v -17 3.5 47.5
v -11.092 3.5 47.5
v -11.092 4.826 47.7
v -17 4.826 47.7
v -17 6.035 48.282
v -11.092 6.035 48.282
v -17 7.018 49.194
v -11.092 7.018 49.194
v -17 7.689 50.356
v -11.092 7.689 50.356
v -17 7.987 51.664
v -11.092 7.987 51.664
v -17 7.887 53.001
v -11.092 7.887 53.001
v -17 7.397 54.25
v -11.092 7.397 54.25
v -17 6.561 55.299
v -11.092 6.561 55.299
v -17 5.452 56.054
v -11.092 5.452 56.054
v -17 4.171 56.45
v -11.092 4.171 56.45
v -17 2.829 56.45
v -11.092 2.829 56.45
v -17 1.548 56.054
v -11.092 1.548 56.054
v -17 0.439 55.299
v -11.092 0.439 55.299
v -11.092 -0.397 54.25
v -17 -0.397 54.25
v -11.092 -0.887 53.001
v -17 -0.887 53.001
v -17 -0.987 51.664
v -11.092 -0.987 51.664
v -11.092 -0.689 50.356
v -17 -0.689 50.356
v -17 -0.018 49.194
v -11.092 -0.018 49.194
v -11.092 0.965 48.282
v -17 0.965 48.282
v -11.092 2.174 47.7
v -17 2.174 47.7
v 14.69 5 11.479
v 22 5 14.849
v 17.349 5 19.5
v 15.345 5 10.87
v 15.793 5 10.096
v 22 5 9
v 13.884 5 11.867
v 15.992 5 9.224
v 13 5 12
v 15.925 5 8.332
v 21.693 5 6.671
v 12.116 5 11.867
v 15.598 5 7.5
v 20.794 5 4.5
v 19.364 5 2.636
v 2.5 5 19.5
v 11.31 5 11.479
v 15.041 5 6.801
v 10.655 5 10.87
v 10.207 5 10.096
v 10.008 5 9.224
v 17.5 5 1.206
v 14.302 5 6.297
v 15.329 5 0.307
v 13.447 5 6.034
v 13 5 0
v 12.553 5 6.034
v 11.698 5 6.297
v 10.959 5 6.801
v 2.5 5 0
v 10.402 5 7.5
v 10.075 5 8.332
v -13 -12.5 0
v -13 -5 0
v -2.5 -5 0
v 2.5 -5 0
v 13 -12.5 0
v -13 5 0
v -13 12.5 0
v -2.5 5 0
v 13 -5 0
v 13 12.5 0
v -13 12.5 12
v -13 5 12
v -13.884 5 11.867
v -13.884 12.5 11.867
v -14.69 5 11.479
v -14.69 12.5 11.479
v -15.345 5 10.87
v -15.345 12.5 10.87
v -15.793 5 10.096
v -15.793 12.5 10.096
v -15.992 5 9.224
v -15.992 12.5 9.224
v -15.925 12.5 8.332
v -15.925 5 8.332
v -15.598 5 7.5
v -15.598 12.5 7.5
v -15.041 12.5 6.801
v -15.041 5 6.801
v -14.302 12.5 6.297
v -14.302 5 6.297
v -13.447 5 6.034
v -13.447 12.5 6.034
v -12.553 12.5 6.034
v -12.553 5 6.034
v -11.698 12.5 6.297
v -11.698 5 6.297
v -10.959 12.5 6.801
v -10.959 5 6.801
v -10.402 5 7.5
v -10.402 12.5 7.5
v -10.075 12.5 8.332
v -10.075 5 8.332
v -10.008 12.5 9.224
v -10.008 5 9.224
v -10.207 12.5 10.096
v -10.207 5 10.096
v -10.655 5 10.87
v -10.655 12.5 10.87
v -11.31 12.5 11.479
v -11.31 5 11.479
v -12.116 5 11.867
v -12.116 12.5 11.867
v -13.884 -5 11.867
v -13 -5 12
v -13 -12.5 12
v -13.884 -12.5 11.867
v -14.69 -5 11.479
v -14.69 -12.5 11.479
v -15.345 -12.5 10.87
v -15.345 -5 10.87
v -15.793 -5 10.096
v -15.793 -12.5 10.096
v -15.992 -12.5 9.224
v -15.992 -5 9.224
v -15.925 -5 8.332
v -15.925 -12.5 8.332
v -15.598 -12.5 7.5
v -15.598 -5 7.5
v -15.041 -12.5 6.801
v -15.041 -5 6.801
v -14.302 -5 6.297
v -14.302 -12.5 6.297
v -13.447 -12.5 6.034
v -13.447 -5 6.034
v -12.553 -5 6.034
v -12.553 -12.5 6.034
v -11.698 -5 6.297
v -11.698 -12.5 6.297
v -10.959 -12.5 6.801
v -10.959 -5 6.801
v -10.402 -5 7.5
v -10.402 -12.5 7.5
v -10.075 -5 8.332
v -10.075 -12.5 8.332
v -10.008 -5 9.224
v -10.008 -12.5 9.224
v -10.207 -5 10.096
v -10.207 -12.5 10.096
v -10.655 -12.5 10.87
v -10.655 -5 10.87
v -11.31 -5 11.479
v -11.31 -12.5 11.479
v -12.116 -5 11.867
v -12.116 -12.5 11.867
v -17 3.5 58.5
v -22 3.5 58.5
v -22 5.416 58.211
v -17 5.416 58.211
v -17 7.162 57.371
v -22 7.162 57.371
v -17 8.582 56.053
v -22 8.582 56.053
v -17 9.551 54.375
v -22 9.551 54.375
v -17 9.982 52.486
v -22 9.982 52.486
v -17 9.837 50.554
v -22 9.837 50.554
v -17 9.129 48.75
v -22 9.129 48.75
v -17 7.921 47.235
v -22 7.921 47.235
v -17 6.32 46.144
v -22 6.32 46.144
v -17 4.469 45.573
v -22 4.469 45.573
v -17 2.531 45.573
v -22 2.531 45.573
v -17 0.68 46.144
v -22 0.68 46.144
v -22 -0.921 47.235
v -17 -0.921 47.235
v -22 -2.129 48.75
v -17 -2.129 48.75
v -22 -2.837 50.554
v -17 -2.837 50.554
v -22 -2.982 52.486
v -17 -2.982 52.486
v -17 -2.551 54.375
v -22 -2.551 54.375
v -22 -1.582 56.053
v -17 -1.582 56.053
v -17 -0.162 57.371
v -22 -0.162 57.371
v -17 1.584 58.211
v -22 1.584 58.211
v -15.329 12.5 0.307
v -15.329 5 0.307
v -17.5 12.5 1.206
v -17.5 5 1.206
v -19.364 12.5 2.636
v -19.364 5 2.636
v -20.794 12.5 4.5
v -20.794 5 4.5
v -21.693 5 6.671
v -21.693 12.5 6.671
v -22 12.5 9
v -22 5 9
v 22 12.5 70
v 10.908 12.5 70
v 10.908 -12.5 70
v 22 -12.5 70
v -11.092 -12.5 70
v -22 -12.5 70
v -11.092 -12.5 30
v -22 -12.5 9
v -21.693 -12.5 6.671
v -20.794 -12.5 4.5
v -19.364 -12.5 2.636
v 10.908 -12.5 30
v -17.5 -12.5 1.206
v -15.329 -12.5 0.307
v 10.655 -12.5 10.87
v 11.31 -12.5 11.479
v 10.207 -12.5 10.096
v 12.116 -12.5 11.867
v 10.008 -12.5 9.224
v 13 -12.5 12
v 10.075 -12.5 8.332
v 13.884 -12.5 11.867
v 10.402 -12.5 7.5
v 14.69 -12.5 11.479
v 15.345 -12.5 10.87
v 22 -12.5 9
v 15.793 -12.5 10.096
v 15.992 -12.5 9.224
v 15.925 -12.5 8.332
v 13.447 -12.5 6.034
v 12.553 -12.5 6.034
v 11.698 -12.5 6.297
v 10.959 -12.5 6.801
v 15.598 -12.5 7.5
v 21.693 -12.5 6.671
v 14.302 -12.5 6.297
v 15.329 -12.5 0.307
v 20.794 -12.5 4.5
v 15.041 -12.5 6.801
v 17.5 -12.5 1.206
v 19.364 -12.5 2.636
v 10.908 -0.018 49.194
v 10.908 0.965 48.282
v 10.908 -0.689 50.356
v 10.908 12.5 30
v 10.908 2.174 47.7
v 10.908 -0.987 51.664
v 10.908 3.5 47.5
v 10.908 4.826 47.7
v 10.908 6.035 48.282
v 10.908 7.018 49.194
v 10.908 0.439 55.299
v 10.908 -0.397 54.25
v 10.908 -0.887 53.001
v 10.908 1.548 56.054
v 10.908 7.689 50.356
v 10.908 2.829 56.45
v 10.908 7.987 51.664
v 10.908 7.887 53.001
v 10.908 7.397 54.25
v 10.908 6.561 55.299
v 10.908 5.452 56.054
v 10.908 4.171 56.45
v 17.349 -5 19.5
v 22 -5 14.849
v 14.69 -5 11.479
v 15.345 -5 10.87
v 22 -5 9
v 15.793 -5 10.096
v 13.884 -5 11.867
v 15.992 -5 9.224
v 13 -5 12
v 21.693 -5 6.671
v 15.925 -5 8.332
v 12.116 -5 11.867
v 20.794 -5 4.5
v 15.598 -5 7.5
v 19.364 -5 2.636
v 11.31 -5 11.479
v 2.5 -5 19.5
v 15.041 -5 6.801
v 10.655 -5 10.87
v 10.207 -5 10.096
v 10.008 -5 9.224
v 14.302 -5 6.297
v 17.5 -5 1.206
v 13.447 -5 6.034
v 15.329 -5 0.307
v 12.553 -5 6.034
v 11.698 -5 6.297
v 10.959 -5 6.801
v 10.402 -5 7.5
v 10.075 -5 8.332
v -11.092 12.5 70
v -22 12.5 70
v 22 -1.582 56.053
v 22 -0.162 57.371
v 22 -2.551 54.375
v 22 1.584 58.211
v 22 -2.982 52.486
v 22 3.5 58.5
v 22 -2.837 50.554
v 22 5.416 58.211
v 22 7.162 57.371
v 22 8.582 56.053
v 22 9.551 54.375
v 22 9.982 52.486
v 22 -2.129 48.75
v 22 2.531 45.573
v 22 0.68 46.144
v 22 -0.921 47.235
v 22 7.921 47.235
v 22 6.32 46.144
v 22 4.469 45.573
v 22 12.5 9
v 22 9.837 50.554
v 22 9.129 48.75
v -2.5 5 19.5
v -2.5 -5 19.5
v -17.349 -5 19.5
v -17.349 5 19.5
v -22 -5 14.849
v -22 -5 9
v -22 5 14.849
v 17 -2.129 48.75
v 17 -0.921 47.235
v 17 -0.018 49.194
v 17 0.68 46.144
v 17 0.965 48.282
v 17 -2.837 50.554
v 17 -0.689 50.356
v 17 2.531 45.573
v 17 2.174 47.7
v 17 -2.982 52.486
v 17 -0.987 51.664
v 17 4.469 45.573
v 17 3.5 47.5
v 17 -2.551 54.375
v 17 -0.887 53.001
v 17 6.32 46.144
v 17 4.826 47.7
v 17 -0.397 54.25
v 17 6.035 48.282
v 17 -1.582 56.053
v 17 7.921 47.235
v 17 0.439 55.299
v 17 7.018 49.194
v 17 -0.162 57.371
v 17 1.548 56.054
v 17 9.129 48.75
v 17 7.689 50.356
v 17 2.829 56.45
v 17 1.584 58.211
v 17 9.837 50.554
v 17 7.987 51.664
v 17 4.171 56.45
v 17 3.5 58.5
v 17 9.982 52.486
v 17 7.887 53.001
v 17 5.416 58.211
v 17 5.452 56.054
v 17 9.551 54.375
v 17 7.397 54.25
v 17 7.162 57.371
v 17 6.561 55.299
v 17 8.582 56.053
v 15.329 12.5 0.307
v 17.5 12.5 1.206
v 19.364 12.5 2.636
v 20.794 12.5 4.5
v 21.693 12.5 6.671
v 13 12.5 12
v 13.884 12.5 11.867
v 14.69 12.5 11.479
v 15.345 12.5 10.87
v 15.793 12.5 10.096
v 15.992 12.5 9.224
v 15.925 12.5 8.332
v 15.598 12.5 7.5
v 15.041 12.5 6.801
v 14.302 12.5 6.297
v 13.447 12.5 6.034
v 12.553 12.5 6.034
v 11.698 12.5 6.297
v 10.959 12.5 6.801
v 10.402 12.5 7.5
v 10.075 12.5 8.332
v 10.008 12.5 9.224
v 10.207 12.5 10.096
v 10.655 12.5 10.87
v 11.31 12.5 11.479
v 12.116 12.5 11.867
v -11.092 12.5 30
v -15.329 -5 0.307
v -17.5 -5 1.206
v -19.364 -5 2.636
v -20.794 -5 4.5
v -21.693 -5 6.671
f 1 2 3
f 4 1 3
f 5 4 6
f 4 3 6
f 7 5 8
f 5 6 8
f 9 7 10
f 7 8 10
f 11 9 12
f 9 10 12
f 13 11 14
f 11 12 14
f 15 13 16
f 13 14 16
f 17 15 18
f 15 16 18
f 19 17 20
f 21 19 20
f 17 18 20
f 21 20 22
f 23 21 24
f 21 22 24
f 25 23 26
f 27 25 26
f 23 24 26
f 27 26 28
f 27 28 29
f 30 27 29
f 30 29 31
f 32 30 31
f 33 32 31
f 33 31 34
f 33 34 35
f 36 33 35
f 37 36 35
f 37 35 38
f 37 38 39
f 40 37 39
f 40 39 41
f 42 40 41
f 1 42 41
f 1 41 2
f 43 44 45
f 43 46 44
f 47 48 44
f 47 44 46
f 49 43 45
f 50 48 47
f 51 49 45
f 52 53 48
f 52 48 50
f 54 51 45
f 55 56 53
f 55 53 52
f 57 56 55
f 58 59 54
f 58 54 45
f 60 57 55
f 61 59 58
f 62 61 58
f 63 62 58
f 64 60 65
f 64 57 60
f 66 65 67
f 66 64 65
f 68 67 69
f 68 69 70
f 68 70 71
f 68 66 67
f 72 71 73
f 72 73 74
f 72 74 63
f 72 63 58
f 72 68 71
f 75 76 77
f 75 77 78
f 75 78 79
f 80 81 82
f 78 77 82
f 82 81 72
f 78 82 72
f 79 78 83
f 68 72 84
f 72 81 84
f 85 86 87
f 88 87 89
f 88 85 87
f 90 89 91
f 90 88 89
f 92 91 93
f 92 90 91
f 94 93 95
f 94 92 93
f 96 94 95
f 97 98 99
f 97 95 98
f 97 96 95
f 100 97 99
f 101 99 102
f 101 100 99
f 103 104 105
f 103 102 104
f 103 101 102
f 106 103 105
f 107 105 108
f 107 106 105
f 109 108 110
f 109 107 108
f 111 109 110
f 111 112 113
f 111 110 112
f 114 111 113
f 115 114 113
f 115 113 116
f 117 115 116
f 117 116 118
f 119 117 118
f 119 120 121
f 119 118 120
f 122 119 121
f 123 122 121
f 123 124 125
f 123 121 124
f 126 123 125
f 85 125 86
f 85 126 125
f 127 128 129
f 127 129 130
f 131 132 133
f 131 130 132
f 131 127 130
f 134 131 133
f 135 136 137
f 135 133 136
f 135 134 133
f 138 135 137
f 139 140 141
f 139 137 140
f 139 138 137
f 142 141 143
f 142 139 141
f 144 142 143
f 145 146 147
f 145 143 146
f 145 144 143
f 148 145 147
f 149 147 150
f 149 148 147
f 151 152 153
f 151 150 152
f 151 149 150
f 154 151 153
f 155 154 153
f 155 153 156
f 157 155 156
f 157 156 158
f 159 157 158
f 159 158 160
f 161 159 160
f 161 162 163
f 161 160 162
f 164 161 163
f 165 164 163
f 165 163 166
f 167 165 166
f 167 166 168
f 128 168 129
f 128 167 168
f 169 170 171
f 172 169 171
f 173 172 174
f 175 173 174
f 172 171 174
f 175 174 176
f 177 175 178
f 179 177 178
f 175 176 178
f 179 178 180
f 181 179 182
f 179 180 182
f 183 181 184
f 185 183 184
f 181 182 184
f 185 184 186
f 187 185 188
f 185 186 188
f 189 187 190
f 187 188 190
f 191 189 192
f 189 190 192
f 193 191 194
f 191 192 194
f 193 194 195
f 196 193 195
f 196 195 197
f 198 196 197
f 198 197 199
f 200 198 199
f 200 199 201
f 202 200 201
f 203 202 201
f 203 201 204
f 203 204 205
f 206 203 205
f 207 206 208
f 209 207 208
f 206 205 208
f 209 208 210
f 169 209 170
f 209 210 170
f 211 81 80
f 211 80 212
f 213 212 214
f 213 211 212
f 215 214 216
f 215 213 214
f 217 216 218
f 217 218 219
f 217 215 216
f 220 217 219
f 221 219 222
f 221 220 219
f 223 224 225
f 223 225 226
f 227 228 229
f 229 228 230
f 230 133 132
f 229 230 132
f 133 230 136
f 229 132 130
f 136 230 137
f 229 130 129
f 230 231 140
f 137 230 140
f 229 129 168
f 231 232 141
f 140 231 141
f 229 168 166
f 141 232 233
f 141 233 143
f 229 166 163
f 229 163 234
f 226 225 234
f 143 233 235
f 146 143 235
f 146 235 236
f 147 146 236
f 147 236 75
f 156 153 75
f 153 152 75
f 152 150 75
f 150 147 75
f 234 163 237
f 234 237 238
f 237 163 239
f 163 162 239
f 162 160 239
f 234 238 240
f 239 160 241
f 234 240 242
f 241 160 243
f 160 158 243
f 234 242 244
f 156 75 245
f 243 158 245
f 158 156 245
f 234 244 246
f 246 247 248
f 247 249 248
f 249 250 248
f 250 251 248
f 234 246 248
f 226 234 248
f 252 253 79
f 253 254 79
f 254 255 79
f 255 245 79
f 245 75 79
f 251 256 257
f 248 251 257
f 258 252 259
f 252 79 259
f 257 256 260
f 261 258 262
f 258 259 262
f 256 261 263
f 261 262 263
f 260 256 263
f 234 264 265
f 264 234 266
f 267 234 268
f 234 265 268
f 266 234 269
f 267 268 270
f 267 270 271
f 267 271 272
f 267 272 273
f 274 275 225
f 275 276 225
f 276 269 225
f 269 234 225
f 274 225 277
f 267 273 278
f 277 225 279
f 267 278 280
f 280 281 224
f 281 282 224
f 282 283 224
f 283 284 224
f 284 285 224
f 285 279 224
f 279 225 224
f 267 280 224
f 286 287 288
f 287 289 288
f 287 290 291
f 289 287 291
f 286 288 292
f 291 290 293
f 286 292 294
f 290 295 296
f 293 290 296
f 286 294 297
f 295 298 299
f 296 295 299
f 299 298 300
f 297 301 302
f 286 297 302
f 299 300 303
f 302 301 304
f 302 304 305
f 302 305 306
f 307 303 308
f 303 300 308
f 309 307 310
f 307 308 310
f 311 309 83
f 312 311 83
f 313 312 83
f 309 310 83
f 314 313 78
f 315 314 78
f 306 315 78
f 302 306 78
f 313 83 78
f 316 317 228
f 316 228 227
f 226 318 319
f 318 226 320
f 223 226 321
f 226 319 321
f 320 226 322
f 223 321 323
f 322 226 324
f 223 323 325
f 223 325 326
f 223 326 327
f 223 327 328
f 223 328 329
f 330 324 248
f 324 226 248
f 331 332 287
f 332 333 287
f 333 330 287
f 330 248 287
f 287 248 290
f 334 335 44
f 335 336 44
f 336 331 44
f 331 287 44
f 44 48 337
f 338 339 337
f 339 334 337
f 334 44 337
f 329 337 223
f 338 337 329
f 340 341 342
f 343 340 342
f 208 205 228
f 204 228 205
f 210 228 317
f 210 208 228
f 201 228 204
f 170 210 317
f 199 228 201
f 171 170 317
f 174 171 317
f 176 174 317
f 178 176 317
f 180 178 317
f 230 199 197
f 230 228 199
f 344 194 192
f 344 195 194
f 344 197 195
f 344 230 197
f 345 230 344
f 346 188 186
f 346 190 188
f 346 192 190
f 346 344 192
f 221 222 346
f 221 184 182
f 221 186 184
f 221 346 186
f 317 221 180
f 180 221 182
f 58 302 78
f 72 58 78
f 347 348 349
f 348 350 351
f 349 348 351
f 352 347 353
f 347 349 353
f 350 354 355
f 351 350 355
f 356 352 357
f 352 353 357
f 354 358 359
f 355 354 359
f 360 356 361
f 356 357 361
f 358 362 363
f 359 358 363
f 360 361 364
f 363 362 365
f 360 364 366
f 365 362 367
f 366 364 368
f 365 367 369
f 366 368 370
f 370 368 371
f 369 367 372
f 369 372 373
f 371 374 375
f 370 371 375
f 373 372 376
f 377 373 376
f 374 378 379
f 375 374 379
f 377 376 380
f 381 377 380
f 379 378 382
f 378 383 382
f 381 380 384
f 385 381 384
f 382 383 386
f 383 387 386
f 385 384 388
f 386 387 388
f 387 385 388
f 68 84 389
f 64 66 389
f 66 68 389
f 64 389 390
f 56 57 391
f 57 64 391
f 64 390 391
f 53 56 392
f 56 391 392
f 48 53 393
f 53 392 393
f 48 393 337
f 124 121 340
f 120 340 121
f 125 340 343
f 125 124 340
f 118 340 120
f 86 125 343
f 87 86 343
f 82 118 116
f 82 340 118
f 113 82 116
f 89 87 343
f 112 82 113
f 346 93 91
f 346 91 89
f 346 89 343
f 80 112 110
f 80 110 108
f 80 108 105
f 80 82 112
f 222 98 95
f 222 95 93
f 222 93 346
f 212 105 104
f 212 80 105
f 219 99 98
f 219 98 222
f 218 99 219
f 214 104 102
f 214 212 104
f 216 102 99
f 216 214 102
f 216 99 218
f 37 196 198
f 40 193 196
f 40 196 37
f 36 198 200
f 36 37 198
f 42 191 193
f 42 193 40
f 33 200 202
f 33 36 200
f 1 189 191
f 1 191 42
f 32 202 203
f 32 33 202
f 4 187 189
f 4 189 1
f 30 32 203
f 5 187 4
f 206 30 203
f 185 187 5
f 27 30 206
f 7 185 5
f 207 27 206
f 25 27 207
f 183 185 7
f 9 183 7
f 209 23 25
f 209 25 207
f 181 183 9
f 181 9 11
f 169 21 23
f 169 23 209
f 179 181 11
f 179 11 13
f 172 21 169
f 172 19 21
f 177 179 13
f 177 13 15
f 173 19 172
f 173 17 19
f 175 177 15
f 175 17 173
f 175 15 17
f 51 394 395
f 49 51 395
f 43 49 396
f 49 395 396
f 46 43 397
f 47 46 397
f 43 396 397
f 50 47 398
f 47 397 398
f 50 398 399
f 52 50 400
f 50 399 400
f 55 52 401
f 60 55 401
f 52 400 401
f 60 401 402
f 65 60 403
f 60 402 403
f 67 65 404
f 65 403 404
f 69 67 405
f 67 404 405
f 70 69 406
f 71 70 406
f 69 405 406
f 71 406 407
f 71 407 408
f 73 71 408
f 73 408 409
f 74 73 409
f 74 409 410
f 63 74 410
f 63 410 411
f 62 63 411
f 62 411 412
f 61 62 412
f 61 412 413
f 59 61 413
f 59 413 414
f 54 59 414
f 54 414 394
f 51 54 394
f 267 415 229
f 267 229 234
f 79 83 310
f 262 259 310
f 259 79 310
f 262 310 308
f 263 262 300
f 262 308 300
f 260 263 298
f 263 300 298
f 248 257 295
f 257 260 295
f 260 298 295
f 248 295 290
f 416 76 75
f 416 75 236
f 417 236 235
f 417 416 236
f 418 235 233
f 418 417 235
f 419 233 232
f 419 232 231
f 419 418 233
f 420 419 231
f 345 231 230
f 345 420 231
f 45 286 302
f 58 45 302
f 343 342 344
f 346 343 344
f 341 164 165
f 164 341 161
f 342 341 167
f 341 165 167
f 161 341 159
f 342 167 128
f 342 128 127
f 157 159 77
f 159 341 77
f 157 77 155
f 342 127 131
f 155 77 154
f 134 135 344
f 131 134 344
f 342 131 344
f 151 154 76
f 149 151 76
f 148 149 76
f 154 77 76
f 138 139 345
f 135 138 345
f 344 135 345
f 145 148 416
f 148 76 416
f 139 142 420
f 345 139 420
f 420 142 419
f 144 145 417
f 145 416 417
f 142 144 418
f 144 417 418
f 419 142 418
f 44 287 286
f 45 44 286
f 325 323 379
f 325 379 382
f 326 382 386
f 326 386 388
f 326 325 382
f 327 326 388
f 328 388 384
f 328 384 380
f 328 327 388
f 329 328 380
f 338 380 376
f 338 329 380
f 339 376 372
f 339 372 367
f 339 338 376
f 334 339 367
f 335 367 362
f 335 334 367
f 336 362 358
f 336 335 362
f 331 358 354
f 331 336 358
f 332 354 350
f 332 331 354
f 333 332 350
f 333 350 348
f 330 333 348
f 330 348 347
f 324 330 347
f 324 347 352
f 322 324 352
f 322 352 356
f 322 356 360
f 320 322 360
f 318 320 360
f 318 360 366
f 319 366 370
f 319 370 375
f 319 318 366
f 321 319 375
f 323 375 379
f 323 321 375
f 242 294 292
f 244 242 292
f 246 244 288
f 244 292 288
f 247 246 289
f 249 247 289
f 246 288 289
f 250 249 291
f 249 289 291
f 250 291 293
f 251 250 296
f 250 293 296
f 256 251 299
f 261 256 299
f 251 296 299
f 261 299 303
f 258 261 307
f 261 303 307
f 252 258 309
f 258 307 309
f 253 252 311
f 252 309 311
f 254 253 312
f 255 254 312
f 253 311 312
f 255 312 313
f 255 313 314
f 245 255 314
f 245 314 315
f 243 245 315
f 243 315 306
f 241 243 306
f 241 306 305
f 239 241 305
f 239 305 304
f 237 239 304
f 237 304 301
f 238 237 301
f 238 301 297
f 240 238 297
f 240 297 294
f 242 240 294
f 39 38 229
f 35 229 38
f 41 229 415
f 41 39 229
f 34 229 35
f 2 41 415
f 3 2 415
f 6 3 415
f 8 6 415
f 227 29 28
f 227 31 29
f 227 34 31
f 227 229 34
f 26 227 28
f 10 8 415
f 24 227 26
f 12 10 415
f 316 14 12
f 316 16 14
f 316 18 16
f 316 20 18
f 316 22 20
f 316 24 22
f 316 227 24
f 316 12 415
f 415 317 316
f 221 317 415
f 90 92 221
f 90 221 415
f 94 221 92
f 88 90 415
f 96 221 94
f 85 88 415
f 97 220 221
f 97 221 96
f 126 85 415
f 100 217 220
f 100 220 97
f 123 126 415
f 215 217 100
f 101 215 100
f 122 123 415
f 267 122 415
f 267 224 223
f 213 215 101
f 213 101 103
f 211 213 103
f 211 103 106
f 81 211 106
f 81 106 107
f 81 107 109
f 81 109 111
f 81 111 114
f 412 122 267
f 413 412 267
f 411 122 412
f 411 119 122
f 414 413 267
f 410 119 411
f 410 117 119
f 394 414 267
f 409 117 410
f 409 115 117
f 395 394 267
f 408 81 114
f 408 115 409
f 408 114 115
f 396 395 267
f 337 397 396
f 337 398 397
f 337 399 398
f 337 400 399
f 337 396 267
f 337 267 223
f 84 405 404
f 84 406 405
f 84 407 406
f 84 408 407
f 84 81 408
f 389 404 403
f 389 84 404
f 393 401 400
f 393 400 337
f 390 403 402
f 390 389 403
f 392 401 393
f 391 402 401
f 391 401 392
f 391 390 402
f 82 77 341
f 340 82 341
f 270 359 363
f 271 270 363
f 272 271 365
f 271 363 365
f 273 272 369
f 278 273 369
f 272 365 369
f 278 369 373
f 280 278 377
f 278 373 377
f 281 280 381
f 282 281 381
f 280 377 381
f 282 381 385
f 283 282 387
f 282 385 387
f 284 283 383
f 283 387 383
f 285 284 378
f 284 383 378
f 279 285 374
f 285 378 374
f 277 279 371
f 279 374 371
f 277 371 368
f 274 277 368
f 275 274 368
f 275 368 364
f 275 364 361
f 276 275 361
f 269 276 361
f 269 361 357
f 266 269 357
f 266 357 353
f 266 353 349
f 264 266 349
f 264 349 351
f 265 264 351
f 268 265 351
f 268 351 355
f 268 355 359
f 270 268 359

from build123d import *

# Parameters (mm, degrees)
SKETCH_1_W               = 44
SKETCH_1_H               = 25
EXTRUDE_1_DEPTH          = 70
SKETCH_2_W               = 22
SKETCH_2_H               = 25
CUT_EXTRUDE_1_DEPTH      = 40
SKETCH_3_R               = 4.5
CUT_EXTRUDE_2_DEPTH      = 50
SKETCH_4_R               = 6.5
CUT_EXTRUDE_4_DEPTH      = 5
SKETCH_5_R               = 3
CUT_EXTRUDE_5_DEPTH      = 29
CUT_EXTRUDE_6_DEPTH      = 5
CUT_EXTRUDE_6_DEPTH_BACK = 5


with BuildPart() as part:
    # 스케치1 → 보스-돌출1 (new body)
    with BuildSketch(Plane.XY):
        Rectangle(SKETCH_1_W, SKETCH_1_H)
    extrude(amount=EXTRUDE_1_DEPTH)

    # 스케치2 → 컷-돌출1 (cut)
    with BuildSketch(Plane.XY.offset(70)):
        with Locations((-0.092136373, 0)):
            Rectangle(SKETCH_2_W, SKETCH_2_H)
    extrude(amount=-CUT_EXTRUDE_1_DEPTH, mode=Mode.SUBTRACT)

    # 스케치3 → 컷-돌출2 (cut)
    with BuildSketch(Plane(origin=(22, 0, 0), x_dir=(0, 0, -1), z_dir=(1, 0, 0))):
        with Locations((-52, 3.5)):
            Circle(SKETCH_3_R)
    extrude(amount=-CUT_EXTRUDE_2_DEPTH, mode=Mode.SUBTRACT)

    # 스케치4 → 컷-돌출4 (cut)
    with BuildSketch(Plane.ZY.offset(-22)):
        with Locations((52, 3.5)):
            Circle(SKETCH_4_R)
    cut_extrude_4 = extrude(amount=CUT_EXTRUDE_4_DEPTH, mode=Mode.SUBTRACT)

    # 스케치5 → 컷-돌출5 (cut)
    with BuildSketch(Plane(origin=(0, 12.5, 0), x_dir=(1, 0, 0), z_dir=(0, 1, 0))):
        with Locations((13, -9)):
            Circle(SKETCH_5_R)
        with BuildLine():
            Line((13, 12.355747981), (13, 0))
            ThreePointArc((13, 0), (19.363961031, -2.636038969), (22, -9))
            Line((22, -9), (34.355747981, -9))
            ThreePointArc((34.355747981, -9), (28.100794214, 6.100794214), (13, 12.355747981))
        make_face()
    cut_extrude_5 = extrude(amount=-CUT_EXTRUDE_5_DEPTH, mode=Mode.SUBTRACT)

    # 대칭 복사2: 컷-돌출4, 컷-돌출5 across plane
    add(cut_extrude_4.mirror(Plane(origin=(0, 0, 0), x_dir=(0, 0, 1), z_dir=(1, 0, 0))), mode=Mode.SUBTRACT)
    add(cut_extrude_5.mirror(Plane(origin=(0, 0, 0), x_dir=(0, 0, 1), z_dir=(1, 0, 0))), mode=Mode.SUBTRACT)

    # 스케치6 → 컷-돌출6 (cut, two sides: drawn at the far end of the back side and taken through both)
    with BuildSketch(Plane(origin=(0, 0, 0), x_dir=(1, 0, 0), z_dir=(0, 1, 0)).offset(-CUT_EXTRUDE_6_DEPTH_BACK)):
        Polygon((2.5, -19.5), (2.5, 5.258137662), (22, 5.258137662), (22, -14.849242405), (17.349242405, -19.5), align=None)
        Polygon((-22, -14.849242405), (-22, 5.258137662), (-2.5, 5.258137662), (-2.5, -19.5), (-17.349242405, -19.5), align=None)
    extrude(amount=CUT_EXTRUDE_6_DEPTH + CUT_EXTRUDE_6_DEPTH_BACK, mode=Mode.SUBTRACT)


solid = part.part
